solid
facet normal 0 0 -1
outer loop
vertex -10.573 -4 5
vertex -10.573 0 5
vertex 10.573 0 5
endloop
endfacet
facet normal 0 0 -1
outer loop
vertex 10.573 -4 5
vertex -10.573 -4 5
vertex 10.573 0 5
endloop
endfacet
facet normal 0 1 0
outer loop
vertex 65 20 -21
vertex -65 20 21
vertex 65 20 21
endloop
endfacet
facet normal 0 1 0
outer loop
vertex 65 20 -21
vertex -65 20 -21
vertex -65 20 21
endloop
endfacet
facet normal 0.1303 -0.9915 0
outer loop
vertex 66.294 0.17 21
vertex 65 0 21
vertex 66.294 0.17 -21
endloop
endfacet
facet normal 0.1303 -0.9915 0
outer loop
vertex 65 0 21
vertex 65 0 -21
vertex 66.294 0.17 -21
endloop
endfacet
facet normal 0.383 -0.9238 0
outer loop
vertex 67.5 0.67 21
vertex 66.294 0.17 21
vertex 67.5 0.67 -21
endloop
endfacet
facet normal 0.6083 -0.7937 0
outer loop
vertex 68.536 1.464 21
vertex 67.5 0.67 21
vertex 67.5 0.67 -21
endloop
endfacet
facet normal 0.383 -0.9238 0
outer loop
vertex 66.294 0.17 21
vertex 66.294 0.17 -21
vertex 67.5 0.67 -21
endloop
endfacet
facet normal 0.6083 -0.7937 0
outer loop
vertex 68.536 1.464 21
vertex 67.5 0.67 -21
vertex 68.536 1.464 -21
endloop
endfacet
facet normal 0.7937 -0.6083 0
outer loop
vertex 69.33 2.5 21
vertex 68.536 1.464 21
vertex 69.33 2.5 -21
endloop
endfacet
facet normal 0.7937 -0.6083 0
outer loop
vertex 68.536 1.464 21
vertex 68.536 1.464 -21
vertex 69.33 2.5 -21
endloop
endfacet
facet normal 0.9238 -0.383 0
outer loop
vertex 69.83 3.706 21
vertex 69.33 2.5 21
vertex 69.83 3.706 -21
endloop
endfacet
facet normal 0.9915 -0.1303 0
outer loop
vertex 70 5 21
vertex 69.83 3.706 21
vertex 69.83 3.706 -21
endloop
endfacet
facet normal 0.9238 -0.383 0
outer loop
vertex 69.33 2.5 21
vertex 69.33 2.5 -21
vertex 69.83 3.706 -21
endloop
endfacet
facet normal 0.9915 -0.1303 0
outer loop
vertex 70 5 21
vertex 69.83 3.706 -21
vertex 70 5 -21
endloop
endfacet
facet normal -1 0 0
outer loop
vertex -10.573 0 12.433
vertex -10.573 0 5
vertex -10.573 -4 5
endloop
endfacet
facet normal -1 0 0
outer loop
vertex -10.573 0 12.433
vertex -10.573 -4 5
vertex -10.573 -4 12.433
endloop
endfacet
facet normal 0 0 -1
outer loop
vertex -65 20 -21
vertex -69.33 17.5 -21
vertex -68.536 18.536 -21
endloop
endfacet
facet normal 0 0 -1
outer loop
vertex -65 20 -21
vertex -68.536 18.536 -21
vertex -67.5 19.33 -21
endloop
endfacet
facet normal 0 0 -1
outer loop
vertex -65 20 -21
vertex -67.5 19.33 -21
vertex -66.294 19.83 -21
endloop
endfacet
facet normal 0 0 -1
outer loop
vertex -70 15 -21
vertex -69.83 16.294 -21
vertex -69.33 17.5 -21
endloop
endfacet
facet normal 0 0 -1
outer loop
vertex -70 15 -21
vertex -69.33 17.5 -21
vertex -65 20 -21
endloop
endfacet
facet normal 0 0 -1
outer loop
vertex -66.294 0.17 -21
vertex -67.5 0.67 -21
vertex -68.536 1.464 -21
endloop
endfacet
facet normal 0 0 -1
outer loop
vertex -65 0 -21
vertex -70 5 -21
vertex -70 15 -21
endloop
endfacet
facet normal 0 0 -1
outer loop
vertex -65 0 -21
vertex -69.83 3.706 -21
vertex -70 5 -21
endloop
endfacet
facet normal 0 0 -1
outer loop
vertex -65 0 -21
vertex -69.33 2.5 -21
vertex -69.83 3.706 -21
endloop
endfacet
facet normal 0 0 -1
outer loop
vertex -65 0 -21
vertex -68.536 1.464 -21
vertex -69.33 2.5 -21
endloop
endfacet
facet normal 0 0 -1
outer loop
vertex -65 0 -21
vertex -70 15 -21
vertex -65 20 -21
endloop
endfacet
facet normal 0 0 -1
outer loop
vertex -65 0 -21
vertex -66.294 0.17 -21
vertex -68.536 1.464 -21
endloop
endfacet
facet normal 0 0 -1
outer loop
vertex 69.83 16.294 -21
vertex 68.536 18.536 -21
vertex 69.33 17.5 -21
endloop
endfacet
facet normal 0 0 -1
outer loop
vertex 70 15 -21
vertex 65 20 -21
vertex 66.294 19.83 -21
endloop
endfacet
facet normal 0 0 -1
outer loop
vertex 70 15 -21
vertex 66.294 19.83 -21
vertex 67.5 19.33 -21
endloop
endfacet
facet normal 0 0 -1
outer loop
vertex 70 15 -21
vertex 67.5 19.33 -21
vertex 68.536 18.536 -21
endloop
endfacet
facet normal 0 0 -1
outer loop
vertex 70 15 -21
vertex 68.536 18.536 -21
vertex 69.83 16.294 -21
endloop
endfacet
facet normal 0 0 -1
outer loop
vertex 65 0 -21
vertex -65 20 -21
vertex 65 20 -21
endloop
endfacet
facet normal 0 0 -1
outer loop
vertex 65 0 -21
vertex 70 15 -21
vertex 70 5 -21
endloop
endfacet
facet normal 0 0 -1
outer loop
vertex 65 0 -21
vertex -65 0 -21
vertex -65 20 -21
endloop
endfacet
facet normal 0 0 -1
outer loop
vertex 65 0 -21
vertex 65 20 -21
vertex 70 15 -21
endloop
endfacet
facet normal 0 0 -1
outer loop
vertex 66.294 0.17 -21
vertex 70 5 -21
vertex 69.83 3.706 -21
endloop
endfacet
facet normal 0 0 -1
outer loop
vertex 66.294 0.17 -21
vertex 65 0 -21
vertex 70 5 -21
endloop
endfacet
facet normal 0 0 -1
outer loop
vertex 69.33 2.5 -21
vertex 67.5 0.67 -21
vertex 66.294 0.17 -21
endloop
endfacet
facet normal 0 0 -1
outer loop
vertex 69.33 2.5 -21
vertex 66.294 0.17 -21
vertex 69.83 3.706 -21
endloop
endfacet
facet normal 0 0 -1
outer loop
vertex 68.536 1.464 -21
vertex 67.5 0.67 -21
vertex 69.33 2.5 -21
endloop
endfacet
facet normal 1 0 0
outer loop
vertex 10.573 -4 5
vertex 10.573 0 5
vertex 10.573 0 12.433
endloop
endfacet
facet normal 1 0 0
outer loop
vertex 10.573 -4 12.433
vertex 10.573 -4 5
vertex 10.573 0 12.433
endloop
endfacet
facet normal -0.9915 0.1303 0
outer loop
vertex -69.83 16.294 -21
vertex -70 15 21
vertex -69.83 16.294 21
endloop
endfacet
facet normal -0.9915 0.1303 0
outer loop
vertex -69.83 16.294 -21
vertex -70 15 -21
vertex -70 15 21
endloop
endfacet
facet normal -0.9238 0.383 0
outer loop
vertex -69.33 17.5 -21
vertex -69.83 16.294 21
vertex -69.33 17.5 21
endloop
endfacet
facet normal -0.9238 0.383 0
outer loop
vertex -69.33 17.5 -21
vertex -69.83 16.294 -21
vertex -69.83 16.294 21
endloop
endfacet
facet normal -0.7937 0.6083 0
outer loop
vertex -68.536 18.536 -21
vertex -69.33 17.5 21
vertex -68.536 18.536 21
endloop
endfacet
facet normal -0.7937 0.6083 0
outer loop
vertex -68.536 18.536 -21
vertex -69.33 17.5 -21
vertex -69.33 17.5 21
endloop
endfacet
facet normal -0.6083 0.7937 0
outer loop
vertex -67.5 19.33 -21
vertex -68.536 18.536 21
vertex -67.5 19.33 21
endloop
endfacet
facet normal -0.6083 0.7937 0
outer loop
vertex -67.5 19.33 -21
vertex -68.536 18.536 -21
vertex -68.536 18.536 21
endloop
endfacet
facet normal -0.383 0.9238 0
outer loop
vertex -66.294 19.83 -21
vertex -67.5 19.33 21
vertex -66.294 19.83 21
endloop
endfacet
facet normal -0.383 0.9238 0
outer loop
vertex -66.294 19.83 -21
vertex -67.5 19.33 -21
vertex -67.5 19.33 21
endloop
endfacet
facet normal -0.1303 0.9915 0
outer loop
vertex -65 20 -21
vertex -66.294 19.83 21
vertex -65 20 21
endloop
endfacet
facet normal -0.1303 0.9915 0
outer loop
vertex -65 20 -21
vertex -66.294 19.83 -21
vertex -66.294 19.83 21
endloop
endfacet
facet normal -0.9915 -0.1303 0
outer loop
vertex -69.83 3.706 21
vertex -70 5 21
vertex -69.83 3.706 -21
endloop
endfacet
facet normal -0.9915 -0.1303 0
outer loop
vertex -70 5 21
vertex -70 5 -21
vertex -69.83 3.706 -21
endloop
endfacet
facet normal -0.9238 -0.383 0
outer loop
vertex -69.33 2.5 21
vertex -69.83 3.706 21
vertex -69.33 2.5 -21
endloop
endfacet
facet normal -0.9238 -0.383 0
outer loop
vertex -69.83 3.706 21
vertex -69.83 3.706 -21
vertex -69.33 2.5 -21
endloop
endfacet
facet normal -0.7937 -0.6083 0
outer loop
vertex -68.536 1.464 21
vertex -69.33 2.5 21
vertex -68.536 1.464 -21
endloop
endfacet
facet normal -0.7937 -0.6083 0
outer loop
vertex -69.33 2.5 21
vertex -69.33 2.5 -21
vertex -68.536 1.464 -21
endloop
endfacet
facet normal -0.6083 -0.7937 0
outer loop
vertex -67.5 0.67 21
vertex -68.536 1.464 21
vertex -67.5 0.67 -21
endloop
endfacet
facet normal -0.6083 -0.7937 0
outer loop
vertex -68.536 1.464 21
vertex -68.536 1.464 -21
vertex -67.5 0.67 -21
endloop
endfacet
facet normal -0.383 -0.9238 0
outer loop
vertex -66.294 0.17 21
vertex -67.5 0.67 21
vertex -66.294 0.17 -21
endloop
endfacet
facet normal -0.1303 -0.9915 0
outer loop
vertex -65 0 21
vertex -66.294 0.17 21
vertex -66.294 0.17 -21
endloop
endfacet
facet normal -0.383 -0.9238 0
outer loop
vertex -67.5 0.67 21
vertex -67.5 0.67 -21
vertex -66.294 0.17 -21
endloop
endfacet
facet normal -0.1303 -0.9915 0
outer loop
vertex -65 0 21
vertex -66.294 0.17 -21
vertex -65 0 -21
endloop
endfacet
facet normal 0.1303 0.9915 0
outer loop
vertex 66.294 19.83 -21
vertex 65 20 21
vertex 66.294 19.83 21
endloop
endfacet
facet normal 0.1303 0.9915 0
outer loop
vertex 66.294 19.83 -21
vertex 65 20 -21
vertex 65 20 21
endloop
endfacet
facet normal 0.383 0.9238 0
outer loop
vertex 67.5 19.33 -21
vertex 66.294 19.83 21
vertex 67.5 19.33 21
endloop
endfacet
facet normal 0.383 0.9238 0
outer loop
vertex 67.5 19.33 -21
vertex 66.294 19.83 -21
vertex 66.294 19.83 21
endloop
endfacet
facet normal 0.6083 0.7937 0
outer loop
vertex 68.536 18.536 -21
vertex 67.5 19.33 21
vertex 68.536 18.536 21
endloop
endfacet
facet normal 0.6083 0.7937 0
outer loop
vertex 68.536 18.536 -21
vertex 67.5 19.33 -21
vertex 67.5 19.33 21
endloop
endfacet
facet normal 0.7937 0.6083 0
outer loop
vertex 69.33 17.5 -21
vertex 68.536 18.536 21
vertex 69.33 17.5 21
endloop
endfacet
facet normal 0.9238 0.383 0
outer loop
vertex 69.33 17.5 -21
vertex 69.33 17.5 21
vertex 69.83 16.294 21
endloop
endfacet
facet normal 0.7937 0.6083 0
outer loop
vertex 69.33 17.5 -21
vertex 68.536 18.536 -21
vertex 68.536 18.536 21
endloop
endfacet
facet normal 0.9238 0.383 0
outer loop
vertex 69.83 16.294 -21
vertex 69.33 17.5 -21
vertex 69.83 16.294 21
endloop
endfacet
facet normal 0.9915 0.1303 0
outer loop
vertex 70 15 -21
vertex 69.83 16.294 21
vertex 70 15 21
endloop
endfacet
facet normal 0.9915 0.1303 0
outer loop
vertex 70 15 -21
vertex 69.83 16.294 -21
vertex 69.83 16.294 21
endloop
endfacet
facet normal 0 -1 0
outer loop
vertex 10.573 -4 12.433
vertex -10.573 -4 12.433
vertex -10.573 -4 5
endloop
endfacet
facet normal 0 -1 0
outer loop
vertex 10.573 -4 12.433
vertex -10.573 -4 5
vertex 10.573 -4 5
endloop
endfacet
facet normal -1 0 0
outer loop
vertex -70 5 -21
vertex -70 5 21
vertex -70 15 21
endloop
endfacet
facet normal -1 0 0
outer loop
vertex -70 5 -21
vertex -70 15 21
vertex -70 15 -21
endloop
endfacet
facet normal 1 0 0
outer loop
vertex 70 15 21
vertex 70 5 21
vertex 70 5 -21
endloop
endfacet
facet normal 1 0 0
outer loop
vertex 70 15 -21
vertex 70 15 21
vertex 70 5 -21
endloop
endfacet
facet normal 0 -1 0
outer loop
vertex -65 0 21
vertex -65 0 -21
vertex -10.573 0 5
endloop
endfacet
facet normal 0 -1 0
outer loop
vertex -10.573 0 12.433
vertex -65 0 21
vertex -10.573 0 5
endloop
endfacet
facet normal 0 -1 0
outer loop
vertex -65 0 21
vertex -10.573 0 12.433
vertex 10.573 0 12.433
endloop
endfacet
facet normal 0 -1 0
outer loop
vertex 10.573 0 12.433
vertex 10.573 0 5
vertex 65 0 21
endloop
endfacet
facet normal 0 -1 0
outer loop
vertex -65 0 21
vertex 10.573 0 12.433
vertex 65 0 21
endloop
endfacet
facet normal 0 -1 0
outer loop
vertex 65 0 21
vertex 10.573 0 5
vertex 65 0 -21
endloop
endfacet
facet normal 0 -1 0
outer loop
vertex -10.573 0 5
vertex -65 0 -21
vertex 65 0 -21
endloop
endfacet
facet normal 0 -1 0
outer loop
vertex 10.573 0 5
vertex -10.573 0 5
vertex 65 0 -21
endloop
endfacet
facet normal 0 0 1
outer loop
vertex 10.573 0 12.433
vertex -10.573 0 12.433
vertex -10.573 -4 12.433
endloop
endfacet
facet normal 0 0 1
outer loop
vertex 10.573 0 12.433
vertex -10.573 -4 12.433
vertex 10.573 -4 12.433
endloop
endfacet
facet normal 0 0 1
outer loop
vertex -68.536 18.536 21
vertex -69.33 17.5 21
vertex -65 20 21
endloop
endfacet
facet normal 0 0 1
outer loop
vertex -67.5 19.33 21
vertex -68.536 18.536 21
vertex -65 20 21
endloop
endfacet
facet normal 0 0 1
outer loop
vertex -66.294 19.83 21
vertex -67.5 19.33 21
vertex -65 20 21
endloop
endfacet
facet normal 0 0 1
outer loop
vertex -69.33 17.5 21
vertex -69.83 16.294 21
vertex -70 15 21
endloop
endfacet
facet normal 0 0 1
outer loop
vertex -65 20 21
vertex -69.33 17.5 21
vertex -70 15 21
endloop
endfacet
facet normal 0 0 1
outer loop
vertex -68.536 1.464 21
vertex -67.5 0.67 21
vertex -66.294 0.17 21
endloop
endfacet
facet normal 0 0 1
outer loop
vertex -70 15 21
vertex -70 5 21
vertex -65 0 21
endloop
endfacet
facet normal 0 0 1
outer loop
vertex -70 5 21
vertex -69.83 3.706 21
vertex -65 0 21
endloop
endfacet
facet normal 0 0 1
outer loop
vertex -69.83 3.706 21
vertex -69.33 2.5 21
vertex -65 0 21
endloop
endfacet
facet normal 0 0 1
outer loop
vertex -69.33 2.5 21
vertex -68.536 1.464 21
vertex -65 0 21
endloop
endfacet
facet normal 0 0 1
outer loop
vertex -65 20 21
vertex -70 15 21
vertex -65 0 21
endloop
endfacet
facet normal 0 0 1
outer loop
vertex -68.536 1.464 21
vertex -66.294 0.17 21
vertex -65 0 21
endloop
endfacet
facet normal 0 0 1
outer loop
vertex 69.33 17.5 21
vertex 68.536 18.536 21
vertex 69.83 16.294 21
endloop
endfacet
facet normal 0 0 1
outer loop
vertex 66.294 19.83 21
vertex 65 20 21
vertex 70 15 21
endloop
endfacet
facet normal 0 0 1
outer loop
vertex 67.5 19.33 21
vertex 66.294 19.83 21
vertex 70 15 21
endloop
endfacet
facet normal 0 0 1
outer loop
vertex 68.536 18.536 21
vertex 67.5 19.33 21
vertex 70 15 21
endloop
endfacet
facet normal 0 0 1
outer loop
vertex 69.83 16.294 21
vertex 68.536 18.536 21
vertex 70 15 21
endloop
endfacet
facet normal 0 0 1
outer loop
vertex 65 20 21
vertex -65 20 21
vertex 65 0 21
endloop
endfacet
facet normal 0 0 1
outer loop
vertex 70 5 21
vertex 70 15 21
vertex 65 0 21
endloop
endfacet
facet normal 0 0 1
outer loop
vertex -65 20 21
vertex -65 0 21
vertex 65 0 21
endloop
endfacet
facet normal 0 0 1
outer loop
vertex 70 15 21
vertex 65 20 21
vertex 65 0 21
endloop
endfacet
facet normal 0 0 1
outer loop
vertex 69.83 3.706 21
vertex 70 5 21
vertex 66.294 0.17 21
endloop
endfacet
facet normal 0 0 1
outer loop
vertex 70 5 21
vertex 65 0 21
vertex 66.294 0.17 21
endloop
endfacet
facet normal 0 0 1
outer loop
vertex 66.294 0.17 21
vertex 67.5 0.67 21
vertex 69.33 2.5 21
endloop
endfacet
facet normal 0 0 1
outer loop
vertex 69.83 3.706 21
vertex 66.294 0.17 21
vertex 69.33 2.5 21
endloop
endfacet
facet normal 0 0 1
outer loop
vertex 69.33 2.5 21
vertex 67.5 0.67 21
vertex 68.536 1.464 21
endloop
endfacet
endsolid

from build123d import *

# Parameters (mm, degrees)
SKETCH_1_W      = 140
SKETCH_1_H      = 42
EXTRUDE_1_DEPTH = 20
SKETCH_2_W      = 21.145082228
SKETCH_2_H      = 7.433476263
EXTRUDE_2_DEPTH = 4
FILLET_1_R      = 5
FILLET_2_R      = 5


with BuildPart() as part:
    # 草图1 → 凸台-拉伸1 (new body)
    with BuildSketch(Plane(origin=(0, 0, 0), x_dir=(1, 0, 0), z_dir=(0, 1, 0))):
        Rectangle(SKETCH_1_W, SKETCH_1_H)
    extrude(amount=EXTRUDE_1_DEPTH)

    # 草图2 → 凸台-拉伸2 (add)
    with BuildSketch(Plane.XZ):
        with Locations((0, 8.716738132)):
            Rectangle(SKETCH_2_W, SKETCH_2_H)
    extrude(amount=EXTRUDE_2_DEPTH)

    # 圆角1
    fillet_1_edges = [part.edges().sort_by_distance(p)[0] for p in [
        (-70, 20, 0),
        (70, 20, 0),
    ]]
    fillet(fillet_1_edges, radius=FILLET_1_R)

    # 圆角2
    fillet_2_edges = [part.edges().sort_by_distance(p)[0] for p in [
        (-70, 0, 0),
        (70, 0, 0),
    ]]
    fillet(fillet_2_edges, radius=FILLET_2_R)


solid = part.part
